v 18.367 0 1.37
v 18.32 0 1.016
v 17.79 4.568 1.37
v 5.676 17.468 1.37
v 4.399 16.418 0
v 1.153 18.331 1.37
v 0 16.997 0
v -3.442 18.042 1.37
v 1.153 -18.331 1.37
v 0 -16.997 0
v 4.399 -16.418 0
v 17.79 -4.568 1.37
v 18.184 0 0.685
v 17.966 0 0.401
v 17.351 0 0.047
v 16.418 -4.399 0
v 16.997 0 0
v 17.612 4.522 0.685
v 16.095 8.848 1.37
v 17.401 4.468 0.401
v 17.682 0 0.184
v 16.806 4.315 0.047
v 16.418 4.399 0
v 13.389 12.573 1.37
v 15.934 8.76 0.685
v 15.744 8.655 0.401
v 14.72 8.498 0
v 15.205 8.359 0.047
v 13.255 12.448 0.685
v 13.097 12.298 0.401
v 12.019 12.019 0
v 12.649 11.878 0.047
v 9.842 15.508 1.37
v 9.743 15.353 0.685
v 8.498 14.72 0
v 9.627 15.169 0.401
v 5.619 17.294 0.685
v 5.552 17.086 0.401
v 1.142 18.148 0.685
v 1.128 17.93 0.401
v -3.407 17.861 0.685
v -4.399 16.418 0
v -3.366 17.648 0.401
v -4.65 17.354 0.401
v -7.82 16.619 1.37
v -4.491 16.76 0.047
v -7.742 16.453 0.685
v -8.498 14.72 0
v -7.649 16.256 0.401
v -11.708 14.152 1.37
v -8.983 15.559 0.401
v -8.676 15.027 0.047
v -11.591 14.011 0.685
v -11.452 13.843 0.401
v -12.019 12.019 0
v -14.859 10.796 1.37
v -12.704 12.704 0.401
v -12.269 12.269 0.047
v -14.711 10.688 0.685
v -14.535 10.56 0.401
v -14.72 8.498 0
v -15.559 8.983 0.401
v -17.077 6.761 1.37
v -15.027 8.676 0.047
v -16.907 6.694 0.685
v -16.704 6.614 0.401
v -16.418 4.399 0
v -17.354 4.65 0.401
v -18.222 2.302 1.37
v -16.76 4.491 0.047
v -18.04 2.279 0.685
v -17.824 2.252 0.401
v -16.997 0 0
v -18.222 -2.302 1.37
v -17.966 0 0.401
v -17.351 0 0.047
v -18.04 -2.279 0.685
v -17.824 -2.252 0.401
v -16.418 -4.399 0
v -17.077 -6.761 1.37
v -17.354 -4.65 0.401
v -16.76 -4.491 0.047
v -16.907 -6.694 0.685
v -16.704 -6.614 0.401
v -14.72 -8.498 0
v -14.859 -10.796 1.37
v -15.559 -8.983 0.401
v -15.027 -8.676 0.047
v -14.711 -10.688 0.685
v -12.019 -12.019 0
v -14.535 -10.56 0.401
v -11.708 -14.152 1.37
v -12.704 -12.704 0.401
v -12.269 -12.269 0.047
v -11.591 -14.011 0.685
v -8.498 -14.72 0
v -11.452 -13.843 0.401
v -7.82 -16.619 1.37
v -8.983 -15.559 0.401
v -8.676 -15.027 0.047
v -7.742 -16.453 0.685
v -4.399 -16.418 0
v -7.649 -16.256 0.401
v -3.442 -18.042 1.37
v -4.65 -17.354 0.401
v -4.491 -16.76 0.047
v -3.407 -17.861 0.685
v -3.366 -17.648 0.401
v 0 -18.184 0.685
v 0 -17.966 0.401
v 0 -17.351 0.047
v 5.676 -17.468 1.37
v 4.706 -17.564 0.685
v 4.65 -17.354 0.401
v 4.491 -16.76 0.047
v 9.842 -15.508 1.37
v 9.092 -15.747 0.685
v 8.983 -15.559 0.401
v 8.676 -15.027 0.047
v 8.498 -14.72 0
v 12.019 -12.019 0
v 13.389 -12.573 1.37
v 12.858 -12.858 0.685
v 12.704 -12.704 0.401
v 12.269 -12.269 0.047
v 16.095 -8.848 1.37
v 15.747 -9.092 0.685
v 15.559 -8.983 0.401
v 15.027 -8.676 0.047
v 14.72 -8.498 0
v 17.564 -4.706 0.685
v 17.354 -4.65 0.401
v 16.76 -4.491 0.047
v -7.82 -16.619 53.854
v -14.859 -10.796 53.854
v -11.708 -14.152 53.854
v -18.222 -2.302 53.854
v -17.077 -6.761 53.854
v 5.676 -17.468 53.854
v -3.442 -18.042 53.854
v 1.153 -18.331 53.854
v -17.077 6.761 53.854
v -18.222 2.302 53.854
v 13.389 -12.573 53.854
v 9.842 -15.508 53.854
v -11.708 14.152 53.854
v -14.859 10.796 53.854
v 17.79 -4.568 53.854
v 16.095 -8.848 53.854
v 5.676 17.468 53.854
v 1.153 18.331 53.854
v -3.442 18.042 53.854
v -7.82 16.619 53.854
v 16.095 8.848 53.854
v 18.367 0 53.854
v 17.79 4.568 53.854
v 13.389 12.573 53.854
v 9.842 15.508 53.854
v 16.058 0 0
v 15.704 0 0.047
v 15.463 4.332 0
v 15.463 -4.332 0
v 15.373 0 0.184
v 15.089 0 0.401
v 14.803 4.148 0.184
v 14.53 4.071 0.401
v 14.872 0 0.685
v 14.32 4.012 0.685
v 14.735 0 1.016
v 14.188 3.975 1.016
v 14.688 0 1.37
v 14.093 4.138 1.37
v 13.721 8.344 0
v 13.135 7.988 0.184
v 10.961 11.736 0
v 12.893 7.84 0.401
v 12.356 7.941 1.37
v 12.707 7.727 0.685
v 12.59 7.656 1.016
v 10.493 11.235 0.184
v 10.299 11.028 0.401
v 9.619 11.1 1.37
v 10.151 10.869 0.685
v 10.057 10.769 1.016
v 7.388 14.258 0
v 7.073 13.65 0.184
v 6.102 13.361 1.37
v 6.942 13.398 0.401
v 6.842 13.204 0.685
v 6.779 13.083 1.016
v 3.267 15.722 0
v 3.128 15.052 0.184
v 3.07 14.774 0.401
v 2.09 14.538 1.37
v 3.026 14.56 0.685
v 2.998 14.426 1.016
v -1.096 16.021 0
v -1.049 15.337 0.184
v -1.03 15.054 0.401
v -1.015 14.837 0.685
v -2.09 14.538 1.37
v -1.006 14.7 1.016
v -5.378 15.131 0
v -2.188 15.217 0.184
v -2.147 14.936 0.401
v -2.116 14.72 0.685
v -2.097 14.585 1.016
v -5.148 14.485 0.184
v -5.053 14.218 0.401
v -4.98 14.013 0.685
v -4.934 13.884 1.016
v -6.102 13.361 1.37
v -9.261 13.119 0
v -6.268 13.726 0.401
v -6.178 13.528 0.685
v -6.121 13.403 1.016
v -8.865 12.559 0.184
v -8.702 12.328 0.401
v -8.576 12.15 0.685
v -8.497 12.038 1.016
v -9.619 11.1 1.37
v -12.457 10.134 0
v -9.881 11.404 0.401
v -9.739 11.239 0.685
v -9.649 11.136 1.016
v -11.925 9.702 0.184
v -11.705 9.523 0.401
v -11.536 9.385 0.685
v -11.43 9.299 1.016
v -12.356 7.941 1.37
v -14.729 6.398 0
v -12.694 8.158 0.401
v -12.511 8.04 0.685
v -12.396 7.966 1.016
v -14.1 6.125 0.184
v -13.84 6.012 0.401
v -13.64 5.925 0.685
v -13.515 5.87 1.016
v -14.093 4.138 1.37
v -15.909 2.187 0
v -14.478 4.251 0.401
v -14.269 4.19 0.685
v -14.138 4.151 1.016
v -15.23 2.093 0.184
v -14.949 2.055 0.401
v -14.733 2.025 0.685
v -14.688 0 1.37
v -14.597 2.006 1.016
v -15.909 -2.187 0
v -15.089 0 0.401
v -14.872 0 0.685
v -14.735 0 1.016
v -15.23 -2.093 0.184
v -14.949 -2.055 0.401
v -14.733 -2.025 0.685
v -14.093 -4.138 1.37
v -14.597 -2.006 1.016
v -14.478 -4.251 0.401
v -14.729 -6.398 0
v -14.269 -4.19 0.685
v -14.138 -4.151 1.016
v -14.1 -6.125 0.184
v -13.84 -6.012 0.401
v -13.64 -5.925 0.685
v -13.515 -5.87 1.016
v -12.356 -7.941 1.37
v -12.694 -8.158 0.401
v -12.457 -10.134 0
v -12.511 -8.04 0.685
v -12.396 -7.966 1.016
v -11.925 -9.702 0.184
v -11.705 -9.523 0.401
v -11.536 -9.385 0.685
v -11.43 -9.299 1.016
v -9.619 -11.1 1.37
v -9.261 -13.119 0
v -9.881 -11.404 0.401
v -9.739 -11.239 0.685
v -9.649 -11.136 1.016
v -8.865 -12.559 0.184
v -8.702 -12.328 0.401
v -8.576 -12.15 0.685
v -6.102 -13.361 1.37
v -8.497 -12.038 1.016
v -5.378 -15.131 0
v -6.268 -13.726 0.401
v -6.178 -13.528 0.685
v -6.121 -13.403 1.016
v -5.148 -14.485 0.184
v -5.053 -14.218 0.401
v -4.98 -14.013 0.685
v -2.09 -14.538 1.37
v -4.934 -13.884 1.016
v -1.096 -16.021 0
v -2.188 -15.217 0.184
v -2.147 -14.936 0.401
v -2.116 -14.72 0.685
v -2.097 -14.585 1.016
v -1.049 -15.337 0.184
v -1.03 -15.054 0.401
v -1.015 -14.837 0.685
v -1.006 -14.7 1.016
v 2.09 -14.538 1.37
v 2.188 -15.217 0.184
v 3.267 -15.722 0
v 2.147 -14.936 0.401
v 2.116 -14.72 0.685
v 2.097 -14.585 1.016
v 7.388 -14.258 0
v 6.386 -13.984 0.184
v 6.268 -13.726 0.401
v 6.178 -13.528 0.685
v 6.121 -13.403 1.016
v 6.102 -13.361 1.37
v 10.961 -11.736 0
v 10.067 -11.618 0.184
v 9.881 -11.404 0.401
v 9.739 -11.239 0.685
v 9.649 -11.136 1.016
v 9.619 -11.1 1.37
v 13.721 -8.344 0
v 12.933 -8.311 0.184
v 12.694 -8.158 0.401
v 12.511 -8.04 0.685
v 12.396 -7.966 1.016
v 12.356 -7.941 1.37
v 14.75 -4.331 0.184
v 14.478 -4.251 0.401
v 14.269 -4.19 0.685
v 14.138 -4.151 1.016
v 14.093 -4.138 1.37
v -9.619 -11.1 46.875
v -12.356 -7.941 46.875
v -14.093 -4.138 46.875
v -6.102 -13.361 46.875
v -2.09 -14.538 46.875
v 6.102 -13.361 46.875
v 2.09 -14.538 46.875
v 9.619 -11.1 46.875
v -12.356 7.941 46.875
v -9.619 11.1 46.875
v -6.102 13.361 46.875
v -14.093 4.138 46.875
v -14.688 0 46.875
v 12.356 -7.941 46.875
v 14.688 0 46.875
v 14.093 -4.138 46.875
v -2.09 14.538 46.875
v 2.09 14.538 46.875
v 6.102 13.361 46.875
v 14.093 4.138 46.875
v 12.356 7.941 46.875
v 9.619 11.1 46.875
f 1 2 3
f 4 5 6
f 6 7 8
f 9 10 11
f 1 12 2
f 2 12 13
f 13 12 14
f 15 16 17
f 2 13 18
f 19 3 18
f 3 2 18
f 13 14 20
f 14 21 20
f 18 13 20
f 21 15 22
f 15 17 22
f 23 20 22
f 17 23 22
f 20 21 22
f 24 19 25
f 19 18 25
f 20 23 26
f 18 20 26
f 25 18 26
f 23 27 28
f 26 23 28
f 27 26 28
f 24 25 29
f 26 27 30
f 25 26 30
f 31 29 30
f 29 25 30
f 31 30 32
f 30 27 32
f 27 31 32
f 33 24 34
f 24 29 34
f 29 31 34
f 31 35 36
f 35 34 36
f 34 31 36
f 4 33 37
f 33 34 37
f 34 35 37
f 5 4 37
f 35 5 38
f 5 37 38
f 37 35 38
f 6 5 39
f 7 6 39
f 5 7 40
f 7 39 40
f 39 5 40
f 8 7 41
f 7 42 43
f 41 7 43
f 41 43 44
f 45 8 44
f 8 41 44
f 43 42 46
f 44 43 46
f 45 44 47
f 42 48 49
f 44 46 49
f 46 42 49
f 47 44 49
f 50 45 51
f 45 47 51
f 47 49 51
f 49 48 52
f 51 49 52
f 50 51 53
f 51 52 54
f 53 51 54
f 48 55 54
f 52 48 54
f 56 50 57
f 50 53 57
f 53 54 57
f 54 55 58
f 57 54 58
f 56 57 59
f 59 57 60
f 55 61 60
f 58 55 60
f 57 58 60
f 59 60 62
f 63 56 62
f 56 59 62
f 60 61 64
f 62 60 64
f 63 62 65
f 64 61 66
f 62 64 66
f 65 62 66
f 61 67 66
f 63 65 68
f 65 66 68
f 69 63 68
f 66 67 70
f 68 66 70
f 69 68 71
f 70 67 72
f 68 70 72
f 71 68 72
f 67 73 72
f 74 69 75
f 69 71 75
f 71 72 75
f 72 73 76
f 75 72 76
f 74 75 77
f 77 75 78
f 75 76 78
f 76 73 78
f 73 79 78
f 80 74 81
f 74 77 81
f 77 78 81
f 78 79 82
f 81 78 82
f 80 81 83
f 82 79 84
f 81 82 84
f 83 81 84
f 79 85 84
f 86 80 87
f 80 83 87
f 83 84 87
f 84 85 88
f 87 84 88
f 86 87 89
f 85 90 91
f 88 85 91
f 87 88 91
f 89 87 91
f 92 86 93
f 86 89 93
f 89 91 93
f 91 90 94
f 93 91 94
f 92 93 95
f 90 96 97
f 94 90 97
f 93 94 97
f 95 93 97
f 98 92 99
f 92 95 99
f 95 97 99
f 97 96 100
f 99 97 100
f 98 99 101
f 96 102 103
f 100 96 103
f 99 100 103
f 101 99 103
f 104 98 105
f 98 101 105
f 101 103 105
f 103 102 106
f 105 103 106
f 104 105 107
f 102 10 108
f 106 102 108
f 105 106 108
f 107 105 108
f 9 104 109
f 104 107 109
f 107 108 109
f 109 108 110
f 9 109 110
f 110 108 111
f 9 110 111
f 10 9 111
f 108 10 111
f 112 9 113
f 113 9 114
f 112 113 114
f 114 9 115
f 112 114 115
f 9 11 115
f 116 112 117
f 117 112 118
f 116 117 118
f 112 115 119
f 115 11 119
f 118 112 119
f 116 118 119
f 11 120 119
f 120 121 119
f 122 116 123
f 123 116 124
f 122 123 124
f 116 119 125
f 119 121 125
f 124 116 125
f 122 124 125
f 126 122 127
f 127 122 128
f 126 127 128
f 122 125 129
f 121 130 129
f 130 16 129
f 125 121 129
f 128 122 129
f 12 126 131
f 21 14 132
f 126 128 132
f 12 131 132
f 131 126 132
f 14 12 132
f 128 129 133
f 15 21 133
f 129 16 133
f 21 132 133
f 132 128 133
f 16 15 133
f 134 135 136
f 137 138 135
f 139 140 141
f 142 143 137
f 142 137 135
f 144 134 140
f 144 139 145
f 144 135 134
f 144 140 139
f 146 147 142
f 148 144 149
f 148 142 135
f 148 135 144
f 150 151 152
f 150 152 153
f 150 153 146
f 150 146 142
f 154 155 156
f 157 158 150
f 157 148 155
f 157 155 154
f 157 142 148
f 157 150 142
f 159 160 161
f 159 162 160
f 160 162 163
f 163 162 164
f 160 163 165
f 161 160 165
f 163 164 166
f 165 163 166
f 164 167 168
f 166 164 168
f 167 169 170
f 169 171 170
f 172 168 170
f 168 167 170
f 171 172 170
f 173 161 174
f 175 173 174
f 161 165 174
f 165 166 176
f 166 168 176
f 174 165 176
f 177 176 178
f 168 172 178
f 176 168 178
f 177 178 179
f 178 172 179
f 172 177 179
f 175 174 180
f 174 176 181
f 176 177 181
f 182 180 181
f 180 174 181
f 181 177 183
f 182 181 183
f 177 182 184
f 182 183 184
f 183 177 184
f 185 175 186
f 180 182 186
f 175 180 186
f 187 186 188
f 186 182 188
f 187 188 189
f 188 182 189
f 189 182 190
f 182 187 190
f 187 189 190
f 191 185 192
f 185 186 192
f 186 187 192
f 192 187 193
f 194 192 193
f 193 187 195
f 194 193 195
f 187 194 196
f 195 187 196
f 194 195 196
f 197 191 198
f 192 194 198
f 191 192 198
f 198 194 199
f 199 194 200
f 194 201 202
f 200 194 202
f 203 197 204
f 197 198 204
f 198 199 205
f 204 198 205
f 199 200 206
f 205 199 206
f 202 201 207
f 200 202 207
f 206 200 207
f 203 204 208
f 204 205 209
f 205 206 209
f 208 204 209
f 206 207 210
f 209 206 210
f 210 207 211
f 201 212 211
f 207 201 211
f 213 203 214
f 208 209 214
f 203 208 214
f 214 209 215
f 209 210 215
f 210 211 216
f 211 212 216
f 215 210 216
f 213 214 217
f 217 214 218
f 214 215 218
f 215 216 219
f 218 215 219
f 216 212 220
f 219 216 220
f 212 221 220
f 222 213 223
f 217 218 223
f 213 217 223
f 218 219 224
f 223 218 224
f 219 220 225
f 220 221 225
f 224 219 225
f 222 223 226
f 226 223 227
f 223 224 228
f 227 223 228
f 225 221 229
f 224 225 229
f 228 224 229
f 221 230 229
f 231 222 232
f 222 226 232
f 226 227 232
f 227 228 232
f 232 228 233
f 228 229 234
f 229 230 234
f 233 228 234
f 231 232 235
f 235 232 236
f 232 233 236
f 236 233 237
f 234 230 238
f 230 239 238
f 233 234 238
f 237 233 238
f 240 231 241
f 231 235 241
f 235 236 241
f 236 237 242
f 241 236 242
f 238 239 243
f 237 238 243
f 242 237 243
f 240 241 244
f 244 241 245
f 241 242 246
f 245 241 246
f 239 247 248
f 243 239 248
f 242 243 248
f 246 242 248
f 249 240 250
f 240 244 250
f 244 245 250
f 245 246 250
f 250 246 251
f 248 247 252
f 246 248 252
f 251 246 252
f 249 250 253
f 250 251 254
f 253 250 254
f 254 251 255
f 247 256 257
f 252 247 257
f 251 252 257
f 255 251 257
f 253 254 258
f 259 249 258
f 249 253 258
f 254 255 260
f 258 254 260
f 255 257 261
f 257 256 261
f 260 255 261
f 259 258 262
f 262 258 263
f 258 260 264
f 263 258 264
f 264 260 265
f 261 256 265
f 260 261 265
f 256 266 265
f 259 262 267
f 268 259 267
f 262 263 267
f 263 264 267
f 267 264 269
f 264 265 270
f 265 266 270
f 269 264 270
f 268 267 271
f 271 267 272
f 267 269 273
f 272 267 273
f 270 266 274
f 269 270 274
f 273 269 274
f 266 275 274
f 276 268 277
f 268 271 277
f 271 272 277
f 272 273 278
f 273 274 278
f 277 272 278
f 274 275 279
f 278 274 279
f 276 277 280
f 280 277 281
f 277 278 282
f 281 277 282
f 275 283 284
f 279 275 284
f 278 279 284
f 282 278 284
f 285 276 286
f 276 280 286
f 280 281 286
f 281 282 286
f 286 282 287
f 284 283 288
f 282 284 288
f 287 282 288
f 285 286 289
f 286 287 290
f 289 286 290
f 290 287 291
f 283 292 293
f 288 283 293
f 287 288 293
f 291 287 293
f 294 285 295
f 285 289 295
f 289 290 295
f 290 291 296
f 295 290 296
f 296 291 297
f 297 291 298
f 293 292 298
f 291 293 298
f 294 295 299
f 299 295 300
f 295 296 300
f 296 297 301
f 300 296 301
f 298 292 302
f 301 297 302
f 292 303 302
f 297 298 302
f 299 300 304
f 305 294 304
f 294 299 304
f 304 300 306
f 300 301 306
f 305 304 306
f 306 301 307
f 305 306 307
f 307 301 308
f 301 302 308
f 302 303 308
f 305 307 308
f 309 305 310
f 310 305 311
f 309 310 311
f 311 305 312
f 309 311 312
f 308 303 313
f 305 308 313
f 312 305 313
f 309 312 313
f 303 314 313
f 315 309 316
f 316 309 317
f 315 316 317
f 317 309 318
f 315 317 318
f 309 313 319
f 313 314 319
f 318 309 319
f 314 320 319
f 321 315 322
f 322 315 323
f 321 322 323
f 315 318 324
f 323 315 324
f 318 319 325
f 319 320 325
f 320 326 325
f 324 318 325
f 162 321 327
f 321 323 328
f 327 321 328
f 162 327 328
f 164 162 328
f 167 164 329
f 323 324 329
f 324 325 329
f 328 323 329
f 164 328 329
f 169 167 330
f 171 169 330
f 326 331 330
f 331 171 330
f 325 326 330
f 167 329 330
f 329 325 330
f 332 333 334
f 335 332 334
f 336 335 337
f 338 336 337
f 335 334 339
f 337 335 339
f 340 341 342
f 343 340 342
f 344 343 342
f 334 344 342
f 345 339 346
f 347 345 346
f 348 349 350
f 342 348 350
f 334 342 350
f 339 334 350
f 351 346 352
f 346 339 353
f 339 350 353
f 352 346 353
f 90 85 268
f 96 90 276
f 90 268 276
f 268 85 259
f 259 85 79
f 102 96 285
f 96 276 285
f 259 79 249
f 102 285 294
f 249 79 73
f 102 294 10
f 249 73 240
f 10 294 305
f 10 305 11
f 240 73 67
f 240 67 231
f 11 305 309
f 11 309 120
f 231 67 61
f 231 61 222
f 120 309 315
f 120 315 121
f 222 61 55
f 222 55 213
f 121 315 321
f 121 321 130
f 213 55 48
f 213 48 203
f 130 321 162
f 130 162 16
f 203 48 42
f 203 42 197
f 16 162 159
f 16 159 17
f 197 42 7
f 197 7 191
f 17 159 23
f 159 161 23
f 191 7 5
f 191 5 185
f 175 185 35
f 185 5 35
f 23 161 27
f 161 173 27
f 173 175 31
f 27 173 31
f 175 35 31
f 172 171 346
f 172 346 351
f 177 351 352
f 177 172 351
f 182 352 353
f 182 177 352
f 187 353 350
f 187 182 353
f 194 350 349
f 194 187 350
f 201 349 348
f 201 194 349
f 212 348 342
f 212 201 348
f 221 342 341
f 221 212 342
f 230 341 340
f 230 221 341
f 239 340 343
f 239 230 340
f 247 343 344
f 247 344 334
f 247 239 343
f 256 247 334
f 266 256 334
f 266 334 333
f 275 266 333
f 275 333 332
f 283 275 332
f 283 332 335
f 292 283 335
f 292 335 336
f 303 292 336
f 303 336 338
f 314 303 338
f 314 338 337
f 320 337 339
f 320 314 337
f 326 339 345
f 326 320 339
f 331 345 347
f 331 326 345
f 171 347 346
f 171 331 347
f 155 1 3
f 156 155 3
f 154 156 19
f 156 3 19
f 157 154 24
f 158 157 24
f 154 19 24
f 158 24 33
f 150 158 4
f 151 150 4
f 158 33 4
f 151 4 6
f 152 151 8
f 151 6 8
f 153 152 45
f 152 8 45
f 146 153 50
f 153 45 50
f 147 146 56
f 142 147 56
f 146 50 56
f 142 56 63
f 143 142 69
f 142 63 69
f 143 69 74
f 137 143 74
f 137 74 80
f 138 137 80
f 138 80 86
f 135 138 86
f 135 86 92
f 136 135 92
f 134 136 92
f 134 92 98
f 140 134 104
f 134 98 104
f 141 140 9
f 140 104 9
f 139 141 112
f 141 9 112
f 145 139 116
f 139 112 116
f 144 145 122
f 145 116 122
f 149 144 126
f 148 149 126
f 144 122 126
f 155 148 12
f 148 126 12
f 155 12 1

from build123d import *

# Parameters (mm, degrees)
F0_R     = 18.3671775814
F0_R_2   = 14.6879268772
F1_DEPTH = 53.8542717695
F2_DEPTH = 46.8754135072
F3_R     = 1.3703832561


with BuildPart() as f1:
    # F0 (on Top) → F1 (new body)
    with BuildSketch(Plane.XY):
        Circle(F0_R)
        Circle(F0_R_2, mode=Mode.SUBTRACT)
        Circle(F0_R_2)
    extrude(amount=F1_DEPTH)

    # F0 (on Top) → F2 (cut)
    with BuildSketch(Plane.XY):
        Circle(F0_R_2)
    extrude(amount=F2_DEPTH, mode=Mode.SUBTRACT)

    # F3
    f3_edges = [f1.edges().sort_by_distance(p)[0] for p in [
        (-14.687927, 0, 0),
        (-18.367178, 0, 0),
    ]]
    fillet(f3_edges, radius=F3_R)


solid = f1.part
